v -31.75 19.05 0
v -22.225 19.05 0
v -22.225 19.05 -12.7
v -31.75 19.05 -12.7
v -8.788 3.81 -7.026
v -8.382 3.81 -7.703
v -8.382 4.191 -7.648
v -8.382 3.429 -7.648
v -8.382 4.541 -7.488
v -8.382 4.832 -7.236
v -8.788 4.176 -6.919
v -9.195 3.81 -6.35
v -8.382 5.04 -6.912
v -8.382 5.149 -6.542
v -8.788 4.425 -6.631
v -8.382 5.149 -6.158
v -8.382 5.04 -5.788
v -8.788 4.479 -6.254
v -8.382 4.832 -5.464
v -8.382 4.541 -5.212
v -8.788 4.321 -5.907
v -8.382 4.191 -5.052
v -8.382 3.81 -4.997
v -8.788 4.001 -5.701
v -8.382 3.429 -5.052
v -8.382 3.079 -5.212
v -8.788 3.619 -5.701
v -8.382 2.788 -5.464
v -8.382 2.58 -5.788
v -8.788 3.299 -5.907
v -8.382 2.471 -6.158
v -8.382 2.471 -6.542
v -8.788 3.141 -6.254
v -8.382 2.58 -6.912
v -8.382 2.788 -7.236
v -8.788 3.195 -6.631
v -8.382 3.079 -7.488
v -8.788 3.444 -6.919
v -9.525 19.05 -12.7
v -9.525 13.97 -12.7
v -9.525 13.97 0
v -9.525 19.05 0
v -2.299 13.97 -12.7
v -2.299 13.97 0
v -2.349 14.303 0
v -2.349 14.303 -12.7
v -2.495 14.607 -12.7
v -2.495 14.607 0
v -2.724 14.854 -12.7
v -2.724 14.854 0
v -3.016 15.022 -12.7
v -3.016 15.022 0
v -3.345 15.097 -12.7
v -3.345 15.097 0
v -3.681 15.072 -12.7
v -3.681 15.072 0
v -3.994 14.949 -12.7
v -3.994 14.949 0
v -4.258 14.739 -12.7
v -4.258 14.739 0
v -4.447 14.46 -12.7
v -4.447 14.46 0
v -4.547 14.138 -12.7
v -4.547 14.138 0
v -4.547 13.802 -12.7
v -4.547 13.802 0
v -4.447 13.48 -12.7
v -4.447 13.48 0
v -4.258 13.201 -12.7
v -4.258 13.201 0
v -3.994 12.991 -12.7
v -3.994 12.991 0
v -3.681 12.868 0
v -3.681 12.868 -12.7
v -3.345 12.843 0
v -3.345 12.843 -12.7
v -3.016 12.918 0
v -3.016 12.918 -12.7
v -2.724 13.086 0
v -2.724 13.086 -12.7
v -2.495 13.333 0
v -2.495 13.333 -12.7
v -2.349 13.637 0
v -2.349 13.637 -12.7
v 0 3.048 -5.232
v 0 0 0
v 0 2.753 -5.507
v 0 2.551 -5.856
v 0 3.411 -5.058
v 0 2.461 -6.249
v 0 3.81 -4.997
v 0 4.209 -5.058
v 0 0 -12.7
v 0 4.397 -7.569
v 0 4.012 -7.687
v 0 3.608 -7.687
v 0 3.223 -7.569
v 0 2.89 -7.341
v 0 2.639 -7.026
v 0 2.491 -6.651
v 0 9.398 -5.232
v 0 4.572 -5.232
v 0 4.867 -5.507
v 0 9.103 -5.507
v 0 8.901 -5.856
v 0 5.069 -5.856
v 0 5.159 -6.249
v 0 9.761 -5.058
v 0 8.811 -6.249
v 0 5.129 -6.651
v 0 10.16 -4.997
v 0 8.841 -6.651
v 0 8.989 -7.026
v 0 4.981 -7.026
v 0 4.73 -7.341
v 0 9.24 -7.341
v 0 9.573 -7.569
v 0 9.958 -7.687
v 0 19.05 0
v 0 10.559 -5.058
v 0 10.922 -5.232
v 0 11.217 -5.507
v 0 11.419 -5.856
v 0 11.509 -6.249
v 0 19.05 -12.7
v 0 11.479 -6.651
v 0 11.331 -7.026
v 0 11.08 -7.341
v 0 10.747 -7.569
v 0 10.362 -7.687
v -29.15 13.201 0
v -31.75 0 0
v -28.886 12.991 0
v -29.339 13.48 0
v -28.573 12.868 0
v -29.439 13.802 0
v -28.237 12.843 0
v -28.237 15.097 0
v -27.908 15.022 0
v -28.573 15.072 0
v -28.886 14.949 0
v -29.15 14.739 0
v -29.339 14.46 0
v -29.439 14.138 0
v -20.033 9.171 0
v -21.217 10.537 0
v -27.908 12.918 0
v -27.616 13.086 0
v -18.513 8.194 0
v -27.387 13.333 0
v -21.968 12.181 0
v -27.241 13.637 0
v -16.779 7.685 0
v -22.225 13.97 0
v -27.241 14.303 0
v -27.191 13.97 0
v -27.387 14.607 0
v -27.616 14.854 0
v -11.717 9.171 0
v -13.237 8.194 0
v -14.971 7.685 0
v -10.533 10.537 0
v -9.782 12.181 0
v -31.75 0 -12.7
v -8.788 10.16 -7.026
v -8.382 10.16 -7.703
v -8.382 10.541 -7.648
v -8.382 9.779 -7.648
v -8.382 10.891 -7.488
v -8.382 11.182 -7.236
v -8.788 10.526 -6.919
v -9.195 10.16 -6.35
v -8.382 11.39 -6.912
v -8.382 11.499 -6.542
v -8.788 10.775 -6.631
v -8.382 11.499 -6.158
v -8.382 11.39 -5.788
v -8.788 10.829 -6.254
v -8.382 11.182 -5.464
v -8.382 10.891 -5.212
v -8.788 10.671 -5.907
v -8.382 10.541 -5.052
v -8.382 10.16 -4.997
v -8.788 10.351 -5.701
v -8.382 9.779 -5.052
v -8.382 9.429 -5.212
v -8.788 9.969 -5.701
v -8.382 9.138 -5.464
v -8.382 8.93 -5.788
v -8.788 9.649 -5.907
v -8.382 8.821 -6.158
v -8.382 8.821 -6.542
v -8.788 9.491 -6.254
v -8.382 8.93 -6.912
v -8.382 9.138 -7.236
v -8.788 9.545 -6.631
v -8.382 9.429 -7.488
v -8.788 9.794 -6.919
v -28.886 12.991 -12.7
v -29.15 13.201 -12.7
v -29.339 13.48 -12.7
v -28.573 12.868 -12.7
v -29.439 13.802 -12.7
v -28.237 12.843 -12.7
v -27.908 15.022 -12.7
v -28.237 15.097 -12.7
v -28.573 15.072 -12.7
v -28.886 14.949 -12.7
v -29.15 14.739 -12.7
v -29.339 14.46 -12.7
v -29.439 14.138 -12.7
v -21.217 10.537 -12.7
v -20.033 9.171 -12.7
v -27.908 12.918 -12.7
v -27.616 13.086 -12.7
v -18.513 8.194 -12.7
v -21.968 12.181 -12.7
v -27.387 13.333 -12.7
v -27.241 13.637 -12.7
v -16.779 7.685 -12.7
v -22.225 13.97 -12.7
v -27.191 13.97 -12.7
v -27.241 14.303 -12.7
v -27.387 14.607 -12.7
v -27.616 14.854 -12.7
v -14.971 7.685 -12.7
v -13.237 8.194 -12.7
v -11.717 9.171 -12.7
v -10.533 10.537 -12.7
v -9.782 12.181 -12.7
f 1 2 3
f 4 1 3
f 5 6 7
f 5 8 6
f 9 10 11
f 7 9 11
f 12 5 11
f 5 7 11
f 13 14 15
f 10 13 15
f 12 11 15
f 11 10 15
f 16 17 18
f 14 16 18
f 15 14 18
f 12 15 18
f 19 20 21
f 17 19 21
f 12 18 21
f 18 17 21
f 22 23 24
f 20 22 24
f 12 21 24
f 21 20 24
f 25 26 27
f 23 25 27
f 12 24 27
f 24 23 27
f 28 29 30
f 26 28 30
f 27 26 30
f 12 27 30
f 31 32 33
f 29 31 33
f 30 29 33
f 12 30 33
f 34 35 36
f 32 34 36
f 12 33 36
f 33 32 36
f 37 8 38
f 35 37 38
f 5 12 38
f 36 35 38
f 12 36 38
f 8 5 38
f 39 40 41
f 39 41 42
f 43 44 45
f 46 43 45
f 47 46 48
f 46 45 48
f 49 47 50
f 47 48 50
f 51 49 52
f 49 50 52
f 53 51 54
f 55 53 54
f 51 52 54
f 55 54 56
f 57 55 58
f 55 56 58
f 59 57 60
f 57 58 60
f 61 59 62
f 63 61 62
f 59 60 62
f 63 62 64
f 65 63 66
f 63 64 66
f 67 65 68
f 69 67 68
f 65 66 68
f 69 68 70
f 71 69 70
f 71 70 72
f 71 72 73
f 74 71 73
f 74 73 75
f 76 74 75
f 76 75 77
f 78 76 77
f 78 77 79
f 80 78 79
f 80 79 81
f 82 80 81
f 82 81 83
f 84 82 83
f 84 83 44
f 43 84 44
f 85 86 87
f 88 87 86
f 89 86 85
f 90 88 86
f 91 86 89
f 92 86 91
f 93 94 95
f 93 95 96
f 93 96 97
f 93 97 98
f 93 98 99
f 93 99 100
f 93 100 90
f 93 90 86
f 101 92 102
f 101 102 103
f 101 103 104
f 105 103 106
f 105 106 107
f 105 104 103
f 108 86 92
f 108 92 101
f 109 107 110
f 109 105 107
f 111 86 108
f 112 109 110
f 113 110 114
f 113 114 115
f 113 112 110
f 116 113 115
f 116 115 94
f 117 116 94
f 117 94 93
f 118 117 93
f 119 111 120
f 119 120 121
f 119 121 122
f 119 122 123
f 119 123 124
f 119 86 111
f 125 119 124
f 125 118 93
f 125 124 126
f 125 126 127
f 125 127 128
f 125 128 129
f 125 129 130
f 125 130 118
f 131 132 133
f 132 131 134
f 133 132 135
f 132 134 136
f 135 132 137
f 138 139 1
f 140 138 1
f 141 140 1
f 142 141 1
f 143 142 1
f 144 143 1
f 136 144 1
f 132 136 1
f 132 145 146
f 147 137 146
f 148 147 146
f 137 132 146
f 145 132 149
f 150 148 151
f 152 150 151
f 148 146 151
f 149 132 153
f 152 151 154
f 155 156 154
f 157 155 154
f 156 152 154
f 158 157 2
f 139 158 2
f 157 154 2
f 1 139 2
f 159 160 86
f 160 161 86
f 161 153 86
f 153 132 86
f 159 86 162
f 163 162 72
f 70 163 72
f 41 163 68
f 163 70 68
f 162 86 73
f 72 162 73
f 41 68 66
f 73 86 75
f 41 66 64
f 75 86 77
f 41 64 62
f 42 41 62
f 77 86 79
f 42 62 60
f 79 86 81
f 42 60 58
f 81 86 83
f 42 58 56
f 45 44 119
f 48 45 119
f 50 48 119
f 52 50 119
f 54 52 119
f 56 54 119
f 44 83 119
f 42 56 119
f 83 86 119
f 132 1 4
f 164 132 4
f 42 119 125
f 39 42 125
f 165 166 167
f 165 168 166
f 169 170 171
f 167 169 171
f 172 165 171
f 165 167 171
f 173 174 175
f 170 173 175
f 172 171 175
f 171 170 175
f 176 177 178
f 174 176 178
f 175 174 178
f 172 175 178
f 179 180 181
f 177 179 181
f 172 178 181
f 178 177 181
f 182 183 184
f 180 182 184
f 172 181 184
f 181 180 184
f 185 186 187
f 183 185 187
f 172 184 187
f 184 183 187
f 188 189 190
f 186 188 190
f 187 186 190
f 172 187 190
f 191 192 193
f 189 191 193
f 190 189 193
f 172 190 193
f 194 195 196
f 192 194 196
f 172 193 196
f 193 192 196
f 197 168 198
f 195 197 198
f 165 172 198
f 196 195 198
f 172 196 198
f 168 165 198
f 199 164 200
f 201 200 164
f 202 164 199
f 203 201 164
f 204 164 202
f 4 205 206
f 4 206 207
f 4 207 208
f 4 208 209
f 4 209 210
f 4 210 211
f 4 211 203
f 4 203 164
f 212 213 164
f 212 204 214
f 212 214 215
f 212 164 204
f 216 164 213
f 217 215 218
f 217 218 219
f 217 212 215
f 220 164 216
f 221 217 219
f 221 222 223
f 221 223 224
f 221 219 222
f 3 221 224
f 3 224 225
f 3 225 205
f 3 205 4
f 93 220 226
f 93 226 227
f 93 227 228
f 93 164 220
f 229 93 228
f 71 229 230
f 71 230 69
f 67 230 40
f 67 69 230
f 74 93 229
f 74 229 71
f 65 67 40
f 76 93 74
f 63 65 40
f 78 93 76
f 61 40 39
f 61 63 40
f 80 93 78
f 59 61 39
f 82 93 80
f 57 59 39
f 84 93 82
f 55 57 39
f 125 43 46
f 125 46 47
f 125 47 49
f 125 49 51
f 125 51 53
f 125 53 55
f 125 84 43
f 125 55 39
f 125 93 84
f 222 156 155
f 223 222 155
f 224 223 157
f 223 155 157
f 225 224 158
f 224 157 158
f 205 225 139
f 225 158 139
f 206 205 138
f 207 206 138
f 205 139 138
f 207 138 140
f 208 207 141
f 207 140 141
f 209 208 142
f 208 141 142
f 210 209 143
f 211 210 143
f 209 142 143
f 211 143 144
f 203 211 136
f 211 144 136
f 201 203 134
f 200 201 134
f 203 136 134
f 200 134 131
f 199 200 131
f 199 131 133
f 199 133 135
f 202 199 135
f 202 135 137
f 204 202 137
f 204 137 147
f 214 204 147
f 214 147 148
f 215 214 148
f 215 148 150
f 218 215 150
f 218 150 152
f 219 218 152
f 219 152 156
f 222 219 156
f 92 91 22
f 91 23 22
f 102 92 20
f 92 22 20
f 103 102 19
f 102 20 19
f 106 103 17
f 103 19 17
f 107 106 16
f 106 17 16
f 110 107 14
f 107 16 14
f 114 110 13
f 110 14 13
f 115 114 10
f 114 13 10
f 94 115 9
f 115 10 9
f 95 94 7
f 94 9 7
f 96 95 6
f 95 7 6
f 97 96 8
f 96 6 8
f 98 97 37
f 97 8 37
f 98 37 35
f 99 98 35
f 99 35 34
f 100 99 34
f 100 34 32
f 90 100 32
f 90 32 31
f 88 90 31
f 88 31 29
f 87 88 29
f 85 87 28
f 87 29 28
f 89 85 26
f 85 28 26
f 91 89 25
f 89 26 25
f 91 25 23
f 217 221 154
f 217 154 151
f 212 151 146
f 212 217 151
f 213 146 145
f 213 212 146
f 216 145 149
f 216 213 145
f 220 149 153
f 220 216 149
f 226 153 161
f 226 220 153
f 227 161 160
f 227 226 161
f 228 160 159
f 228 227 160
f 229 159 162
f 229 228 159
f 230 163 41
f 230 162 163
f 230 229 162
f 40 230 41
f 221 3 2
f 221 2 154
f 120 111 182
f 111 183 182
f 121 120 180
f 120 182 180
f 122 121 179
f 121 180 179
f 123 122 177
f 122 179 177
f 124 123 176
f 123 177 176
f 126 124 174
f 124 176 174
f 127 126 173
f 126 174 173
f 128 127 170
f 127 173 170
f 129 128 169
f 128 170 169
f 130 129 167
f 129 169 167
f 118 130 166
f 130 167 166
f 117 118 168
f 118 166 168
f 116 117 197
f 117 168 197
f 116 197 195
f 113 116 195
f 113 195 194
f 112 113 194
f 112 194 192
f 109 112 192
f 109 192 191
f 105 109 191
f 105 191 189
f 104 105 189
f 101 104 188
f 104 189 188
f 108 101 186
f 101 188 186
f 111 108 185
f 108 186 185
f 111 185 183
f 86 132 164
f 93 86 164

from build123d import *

# Parameters (mm, degrees)
SKETCH1_W                 = 12.7
SKETCH1_H                 = 19.05
BASE_DEPTH                = 31.75
MOTORSLOT_DEPTH           = 40.144028919
MOTORHOLES_D              = 2.2606
F_6_32_TAPPED_HOLE1_D     = 2.7051
F_6_32_TAPPED_HOLE1_DEPTH = 8.382
F_6_32_TAPPED_HOLE1_TIP   = 0.81269403


with BuildPart() as part:
    # Sketch1 → Base (new body)
    with BuildSketch(Plane(origin=(0, 0, 0), x_dir=(0, 0, -1), z_dir=(1, 0, 0))):
        with Locations((6.35, 9.525)):
            Rectangle(SKETCH1_W, SKETCH1_H)
    extrude(amount=-BASE_DEPTH)

    # Sketch5 → MotorSlot (cut, through all)
    with BuildSketch(Plane(origin=(0, 0, -12.7), x_dir=(-1, 0, 0), z_dir=(0, 0, -1))):
        with BuildLine():
            Line((22.225, 19.05), (22.225, 13.97))
            ThreePointArc((22.225, 13.97), (15.875, 7.62), (9.525, 13.97))
            Line((9.525, 13.97), (9.525, 19.05))
            ThreePointArc((9.525, 19.05), (15.875, 25.4), (22.225, 19.05))
        make_face()
    extrude(amount=-MOTORSLOT_DEPTH, mode=Mode.SUBTRACT)

    # MotorHoles (through all)
    with Locations(Plane(origin=(0, 0, -12.7), x_dir=(-1, 0, 0), z_dir=(0, 0, -1))):
        with Locations((3.429, 13.97), (28.321, 13.97)):
            Hole(MOTORHOLES_D / 2)

    # #6-32 Tapped Hole1
    with Locations(Plane(origin=(0, 0, 0), x_dir=(0, 0, -1), z_dir=(1, 0, 0))):
        with Locations((6.35, 3.81), (6.35, 10.16)):
            Hole(F_6_32_TAPPED_HOLE1_D / 2, depth=F_6_32_TAPPED_HOLE1_DEPTH)
            with Locations((0, 0, -(F_6_32_TAPPED_HOLE1_DEPTH + F_6_32_TAPPED_HOLE1_TIP / 2))):  # 118° drill point
                Cone(0, F_6_32_TAPPED_HOLE1_D / 2, F_6_32_TAPPED_HOLE1_TIP, mode=Mode.SUBTRACT)


solid = part.part
